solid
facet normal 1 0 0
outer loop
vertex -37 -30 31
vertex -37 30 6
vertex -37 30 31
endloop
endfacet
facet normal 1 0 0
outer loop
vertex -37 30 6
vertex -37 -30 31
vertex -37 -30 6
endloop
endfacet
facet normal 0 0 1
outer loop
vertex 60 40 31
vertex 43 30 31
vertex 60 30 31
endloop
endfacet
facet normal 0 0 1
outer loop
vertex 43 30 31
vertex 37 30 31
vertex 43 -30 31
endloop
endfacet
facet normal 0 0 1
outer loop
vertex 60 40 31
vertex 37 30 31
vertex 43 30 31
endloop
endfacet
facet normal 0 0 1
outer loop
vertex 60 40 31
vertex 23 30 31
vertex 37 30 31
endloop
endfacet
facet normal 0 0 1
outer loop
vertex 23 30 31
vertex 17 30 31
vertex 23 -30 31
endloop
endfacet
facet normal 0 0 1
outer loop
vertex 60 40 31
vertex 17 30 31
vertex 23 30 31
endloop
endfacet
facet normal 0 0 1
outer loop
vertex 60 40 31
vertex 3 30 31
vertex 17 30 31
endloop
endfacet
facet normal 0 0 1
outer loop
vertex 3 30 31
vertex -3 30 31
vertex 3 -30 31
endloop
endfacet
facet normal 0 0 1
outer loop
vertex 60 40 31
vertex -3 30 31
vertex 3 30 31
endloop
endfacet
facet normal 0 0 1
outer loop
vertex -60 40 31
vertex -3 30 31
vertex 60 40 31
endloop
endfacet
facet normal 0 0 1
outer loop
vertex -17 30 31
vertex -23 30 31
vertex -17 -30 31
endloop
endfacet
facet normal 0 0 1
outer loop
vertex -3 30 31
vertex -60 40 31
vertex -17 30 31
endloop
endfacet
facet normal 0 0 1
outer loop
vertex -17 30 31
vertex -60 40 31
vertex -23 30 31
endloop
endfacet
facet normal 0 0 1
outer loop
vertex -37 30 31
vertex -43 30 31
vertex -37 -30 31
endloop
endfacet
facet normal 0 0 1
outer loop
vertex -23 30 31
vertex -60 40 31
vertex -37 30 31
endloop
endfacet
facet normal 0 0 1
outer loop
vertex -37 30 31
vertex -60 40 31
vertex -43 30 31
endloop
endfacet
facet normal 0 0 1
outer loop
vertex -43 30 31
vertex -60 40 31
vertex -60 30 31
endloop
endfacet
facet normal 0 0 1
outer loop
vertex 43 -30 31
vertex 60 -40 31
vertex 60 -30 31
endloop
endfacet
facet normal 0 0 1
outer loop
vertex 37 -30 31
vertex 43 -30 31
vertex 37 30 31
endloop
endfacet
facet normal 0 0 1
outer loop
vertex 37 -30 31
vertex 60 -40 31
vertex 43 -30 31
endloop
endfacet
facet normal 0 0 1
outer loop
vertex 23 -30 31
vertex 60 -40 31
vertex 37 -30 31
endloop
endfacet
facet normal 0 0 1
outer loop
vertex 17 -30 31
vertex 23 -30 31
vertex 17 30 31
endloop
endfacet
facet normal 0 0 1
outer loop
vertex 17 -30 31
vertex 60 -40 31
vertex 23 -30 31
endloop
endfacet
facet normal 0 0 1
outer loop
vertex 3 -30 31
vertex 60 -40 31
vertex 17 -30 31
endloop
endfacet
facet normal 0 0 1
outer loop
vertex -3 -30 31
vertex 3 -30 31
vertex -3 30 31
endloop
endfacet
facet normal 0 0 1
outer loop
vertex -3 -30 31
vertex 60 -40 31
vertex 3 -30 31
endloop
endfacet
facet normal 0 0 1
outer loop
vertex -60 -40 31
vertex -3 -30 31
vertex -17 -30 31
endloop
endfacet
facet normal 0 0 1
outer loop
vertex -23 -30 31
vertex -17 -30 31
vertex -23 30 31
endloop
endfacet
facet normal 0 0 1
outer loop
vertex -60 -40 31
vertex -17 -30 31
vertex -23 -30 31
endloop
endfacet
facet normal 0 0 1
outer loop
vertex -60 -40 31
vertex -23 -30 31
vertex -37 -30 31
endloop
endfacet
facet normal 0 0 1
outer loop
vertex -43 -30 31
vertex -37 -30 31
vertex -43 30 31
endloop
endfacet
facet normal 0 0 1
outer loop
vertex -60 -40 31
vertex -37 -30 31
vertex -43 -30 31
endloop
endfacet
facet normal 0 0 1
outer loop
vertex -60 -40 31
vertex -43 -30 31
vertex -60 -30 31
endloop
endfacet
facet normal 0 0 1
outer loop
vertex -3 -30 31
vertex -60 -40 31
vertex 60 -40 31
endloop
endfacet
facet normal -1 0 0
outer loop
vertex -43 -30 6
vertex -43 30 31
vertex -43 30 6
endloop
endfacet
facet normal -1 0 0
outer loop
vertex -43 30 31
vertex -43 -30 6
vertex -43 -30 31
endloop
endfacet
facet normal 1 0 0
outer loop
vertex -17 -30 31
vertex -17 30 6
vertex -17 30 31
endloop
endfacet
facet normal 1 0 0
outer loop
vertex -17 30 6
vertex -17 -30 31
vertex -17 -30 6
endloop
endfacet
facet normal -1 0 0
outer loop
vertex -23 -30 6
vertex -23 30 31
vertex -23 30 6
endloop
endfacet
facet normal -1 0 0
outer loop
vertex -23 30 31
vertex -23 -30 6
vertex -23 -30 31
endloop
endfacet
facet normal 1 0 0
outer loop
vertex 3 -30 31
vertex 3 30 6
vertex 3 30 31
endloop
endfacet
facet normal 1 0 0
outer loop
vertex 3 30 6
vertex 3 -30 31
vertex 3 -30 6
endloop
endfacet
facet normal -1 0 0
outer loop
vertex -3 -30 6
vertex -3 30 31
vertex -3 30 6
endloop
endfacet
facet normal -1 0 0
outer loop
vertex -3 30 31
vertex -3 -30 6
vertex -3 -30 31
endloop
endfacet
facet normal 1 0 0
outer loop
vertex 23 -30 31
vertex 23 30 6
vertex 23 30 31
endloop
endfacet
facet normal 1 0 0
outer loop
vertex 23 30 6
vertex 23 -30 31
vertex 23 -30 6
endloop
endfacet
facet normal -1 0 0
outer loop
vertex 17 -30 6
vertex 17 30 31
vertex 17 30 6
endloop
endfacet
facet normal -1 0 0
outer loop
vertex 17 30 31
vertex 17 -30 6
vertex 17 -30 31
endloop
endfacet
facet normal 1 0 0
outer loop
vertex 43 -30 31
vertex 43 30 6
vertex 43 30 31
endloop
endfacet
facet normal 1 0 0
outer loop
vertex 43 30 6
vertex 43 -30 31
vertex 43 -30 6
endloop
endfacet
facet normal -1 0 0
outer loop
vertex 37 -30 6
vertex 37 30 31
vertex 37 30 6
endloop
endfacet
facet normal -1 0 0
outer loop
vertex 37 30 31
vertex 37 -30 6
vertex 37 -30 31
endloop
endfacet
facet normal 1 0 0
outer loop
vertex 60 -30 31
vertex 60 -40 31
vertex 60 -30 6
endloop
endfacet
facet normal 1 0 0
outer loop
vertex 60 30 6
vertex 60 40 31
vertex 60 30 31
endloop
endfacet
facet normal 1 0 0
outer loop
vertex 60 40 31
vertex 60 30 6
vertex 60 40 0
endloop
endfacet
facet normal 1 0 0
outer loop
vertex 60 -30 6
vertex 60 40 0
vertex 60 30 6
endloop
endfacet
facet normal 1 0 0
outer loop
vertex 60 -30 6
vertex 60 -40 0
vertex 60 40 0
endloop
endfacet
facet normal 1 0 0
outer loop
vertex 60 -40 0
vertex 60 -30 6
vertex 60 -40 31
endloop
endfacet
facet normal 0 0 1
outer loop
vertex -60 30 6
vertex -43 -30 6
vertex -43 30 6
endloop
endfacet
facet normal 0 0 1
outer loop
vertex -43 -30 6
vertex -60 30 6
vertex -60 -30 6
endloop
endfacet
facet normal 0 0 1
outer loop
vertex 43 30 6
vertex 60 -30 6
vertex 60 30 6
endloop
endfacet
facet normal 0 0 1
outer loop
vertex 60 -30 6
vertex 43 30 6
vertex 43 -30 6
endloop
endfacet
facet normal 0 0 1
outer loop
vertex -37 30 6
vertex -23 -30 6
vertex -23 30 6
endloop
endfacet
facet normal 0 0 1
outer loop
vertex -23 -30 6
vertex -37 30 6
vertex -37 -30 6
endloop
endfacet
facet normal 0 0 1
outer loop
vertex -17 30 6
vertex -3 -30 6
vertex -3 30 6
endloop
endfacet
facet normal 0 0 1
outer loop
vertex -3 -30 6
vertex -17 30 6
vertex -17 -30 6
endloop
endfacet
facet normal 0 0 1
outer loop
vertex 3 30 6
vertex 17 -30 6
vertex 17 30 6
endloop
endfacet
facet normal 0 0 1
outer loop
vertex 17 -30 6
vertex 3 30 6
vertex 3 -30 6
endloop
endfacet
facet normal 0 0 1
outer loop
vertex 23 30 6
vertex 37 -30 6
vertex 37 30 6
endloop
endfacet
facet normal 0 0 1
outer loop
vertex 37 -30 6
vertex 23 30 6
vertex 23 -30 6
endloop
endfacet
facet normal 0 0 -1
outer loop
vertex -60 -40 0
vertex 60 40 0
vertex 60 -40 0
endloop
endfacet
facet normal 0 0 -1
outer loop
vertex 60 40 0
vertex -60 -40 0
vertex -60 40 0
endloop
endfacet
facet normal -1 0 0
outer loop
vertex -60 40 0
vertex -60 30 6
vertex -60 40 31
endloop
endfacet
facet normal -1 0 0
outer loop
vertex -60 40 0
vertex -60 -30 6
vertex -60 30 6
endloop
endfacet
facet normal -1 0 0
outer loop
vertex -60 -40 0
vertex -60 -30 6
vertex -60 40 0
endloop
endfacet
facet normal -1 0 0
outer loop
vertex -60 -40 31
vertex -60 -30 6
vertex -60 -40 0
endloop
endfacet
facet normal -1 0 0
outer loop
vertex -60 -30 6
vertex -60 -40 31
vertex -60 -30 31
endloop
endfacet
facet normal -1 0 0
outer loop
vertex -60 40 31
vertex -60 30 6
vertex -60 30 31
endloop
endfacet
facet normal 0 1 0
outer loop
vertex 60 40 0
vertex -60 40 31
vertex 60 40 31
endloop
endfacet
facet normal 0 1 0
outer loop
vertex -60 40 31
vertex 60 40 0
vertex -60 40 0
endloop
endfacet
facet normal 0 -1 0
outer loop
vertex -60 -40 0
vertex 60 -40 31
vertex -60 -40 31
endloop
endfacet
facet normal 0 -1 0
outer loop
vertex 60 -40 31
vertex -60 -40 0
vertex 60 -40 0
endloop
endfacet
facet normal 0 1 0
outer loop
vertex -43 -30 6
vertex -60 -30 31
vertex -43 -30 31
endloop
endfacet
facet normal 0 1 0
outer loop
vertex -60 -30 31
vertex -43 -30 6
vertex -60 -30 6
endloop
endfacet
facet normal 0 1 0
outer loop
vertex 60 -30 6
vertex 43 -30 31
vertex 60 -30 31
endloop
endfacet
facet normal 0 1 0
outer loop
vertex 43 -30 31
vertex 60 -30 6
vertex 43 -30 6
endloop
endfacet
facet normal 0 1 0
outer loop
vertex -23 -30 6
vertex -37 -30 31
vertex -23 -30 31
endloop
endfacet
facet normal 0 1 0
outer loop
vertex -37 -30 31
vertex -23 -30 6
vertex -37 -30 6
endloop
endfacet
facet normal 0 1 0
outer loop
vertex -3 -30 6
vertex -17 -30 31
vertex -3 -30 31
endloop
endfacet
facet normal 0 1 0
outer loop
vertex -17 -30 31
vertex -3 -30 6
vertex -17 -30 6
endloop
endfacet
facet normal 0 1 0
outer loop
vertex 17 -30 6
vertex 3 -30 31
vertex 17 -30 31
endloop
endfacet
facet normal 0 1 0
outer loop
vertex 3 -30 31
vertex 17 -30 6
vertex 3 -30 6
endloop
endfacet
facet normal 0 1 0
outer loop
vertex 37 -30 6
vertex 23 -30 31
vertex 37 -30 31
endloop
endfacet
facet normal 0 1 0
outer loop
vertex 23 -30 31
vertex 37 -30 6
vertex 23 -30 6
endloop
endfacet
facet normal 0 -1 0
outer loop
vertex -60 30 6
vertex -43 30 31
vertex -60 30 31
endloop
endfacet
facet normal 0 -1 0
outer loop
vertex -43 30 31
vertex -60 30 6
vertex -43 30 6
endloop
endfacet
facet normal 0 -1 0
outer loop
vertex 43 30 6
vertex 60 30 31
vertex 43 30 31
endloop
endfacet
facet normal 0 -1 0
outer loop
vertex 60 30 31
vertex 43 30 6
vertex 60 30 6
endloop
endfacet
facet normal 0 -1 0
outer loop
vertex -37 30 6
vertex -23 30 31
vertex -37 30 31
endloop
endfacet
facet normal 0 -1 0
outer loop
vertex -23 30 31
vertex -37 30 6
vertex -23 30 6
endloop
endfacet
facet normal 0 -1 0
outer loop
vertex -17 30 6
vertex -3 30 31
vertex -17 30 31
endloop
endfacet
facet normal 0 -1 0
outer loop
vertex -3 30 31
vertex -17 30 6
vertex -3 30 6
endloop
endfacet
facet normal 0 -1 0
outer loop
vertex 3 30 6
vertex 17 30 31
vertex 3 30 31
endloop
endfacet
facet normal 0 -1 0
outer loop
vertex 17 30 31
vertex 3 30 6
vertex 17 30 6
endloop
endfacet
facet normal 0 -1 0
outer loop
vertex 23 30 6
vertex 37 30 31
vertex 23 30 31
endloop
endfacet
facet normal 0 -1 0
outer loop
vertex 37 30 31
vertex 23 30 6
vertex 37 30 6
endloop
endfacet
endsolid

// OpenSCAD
$fn = 32;

// ----------------------------------------------------------------------
// Rib frame 120 x 80 x 31
// 5 ribs at 20 mm pitch
// ----------------------------------------------------------------------

// --- parameters (mm) ---
frame = [120, 80, 6];  // base plate size (x, y, z)
rail_w = 10;           // side rail width
ribs = 5;              // number of ribs
rib_t = 6;             // rib thickness
rib_h = 25;            // rib height above the base plate
pitch = 20;            // pitch between rib centres

// --- derived feature positions (mm) ---
span = (ribs - 1) * pitch;          // = 80   distance between the outer ribs
origin_x = -span / 2;               // = -40   X of the first rib
rib_len = frame[1] - 2 * rail_w + 2;  // = 62   rib length, 1 mm into each rail
feature_centers = [
  [origin_x + 0 * pitch, 0],
  [origin_x + 1 * pitch, 0],
  [origin_x + 2 * pitch, 0],
  [origin_x + 3 * pitch, 0],
  [origin_x + 4 * pitch, 0]
];   // rib centre line, drives the rib loop

// base plate, two side rails, then the ribs read straight off feature_centers
union() {
  translate([-frame[0] / 2, -frame[1] / 2, 0]) cube(frame);
  translate([-frame[0] / 2, -frame[1] / 2, 0]) cube([frame[0], rail_w, frame[2] + rib_h]);
  translate([-frame[0] / 2, frame[1] / 2 - rail_w, 0]) cube([frame[0], rail_w, frame[2] + rib_h]);
  for (centre = feature_centers)
    translate([centre[0] - rib_t / 2, centre[1] - rib_len / 2, frame[2] - 1])
      cube([rib_t, rib_len, rib_h + 1]);
}
